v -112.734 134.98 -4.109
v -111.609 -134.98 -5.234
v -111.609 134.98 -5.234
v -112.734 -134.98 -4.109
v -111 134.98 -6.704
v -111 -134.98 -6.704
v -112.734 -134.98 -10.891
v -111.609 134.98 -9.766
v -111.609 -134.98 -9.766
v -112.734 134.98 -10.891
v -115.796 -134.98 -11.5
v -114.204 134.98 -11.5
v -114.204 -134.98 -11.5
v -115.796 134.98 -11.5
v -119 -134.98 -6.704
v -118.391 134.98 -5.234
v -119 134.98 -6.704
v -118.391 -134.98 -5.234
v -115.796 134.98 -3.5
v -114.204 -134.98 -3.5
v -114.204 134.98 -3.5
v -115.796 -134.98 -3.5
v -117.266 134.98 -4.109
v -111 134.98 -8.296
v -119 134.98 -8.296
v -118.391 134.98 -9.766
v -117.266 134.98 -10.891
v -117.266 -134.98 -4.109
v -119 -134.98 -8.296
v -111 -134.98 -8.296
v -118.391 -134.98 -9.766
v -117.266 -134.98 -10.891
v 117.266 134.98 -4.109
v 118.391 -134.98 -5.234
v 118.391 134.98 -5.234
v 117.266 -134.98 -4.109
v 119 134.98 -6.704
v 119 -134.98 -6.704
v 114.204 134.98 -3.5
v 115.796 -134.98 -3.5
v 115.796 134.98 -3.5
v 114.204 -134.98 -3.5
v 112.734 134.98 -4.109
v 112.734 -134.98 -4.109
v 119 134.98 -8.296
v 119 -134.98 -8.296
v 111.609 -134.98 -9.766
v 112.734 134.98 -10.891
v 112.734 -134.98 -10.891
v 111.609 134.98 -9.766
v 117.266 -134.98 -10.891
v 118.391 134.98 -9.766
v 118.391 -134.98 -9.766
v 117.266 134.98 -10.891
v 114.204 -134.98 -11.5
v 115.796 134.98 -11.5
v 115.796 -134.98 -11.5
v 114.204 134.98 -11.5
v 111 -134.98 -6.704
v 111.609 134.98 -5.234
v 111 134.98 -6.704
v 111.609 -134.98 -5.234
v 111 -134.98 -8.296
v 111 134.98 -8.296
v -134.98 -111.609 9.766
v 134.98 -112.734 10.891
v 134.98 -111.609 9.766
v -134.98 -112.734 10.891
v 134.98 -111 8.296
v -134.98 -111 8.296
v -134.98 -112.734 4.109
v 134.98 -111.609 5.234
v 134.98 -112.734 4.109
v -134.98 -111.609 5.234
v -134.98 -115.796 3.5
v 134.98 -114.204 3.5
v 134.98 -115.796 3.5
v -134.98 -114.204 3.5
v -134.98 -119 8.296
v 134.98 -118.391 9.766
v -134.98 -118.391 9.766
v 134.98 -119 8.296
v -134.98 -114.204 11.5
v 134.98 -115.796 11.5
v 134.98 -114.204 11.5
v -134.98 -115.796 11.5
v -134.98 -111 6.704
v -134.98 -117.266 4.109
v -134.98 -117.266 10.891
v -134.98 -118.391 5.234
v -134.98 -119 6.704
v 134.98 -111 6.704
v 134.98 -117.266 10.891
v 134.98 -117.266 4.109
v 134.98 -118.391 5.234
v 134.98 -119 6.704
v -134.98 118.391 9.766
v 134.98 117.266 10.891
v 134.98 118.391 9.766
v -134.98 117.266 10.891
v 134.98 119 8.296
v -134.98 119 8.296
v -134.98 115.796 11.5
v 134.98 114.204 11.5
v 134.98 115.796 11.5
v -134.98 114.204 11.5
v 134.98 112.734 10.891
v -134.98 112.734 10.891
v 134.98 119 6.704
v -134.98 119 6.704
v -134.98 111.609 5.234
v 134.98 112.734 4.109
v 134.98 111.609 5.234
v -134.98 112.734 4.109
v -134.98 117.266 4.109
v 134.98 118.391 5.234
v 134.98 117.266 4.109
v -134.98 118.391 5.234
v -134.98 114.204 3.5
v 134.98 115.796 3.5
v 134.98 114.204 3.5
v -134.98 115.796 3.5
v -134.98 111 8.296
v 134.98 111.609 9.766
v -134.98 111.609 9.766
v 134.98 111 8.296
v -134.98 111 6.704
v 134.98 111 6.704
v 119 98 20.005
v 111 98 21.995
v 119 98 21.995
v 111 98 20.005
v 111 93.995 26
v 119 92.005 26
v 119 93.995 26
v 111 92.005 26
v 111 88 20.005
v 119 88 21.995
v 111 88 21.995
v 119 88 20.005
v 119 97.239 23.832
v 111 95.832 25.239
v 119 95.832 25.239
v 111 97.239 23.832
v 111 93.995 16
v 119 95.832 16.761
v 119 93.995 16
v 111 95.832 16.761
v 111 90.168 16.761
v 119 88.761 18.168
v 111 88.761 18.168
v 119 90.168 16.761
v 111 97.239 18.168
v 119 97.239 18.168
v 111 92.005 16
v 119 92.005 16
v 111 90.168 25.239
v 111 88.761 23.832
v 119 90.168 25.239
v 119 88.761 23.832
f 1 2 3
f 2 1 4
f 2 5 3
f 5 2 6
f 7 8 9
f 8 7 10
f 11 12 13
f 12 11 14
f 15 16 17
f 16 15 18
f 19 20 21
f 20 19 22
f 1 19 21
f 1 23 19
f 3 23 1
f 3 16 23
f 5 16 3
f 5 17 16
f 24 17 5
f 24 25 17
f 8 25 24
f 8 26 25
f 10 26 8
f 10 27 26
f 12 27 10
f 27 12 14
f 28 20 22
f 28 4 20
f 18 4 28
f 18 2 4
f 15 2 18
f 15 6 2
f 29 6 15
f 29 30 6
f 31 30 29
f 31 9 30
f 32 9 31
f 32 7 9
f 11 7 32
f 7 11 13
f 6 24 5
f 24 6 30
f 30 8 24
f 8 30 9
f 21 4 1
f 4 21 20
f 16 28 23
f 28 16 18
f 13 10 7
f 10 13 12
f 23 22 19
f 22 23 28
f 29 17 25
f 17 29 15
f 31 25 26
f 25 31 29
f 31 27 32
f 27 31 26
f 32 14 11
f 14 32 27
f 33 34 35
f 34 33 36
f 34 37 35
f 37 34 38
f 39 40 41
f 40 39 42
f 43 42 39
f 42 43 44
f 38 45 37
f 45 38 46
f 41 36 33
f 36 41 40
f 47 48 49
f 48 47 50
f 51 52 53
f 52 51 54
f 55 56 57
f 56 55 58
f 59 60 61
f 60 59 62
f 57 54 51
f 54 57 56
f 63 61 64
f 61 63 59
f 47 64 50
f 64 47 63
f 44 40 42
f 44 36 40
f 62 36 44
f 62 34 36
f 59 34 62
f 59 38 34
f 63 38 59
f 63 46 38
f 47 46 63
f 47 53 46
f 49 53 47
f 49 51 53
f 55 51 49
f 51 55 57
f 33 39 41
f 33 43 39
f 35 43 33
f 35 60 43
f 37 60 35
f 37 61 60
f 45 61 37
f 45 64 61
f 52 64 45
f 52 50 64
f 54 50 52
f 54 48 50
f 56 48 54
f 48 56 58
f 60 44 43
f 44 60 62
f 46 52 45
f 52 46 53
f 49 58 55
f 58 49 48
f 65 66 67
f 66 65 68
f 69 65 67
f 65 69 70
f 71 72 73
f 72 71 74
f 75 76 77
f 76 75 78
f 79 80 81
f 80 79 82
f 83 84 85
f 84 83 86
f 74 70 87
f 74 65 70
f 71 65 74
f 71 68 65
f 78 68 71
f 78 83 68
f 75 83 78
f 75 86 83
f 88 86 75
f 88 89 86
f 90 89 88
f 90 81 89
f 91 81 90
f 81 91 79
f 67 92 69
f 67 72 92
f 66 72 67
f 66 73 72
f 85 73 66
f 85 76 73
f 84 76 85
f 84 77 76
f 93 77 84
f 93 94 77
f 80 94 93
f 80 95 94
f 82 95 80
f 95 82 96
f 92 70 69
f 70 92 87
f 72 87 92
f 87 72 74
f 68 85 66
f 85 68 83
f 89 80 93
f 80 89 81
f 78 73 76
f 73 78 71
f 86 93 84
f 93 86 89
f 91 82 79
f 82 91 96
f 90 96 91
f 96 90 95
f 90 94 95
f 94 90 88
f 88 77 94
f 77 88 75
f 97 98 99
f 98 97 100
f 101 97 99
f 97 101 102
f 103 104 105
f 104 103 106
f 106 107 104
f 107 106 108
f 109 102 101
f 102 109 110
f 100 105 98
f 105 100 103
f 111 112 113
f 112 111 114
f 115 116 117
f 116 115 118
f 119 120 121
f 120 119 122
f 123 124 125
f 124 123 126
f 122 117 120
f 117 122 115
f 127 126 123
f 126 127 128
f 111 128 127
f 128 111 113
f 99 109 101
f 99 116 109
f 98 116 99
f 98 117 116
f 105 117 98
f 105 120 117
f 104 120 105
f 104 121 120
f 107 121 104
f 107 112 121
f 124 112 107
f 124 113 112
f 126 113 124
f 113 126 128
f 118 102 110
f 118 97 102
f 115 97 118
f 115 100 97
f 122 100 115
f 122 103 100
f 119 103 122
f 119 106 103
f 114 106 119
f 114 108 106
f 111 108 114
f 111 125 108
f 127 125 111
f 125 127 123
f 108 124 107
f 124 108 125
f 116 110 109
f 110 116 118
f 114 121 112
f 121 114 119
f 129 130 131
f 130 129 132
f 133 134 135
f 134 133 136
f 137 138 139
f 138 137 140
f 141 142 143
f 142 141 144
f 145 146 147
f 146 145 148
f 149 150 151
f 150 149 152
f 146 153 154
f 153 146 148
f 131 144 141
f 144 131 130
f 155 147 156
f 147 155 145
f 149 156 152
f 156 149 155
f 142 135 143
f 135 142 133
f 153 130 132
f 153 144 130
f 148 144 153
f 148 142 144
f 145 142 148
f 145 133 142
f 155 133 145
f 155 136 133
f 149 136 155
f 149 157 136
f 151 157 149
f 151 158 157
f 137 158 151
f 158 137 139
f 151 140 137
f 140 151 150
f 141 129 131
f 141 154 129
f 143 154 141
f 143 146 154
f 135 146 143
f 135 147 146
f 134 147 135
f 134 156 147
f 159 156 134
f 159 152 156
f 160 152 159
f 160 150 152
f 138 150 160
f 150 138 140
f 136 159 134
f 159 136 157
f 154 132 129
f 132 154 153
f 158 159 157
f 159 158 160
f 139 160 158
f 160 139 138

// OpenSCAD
// file: util.scad
function accurate_diam(diam,sides) = 1 / cos(180/sides) / 2 * diam;

module hole(diam,len,sides=8) {
  rotate([0,0,180/sides]) {
    cylinder(r=accurate_diam(diam,sides),h=len,center=true,$fn=sides);
  }
}

module accurate_circle(diam,sides=8) {
  rotate([0,0,180/sides]) {
    circle(r=accurate_diam(diam,sides),center=true,$fn=sides);
  }
}

module debug_axes() {
  color("red") {
    translate([50,0,0]) cube([100,.2,.2],center=true);
    translate([0,50,0]) cube([.2,100,.2],center=true);
    translate([0,0,50]) cube([.2,.2,100],center=true);
  }
}
// main file
use     <util.scad>;
include <config.scad>;

resolution = 16;
rod_diam   = 8;

build = 200;

xy_offset = bearing_diam;

xy_overhead = bearing_diam;
rod_len = build + xy_overhead*4 + sheet_thickness*2;
rod_pos = build/2 + xy_overhead;

module motor() {
  difference() {
    translate([0,0,-motor_side/2]) cube([motor_side,motor_side,motor_side],center=true);
    for(end=[left,right]) {
      for(side=[front,rear]) {
        translate([motor_hole_spacing/2*side,motor_hole_spacing/2*end,0]) cylinder(r=motor_screw_diam/2,h=100,center=true);
      }
    }
  }

  translate([0,0,motor_shaft_len/2]) cylinder(r=motor_shaft_diam/2,h=motor_shaft_len,center=true);
}

module axis_rod_set() {
  for(x=[left,right]) {
    translate([rod_pos*x,0,0]) {
      rotate([90,0,0]) {
        color("silver") hole(8,rod_len,resolution);
      }
    }
  }
}

translate([0,0,-xy_offset/2]) {
  rotate([0,0,0]) {
    axis_rod_set();
  }
}
translate([0,0,xy_offset/2]) {
  rotate([0,0,90]) {
    axis_rod_set();
  }
}

% cube([build,build,xy_offset],center=true);
for(n=[-1,1]) {
  translate([(rod_len/2-sheet_thickness/2)*n,0,0]) {
    % cube([sheet_thickness,rod_len,xy_offset*4],center=true);
  }
  translate([0,(rod_len/2-sheet_thickness/2)*n,0]) {
    % cube([rod_len,sheet_thickness,xy_offset*4],center=true);
  }
}

belt_idler_height = 8;

/*
translate([rod_pos-xy_overhead/2,rod_len/2-sheet_thickness-motor_side/2,xy_offset/2+motor_side/2+xy_overhead]) {
  translate([0,0,-motor_hole_spacing/2]) {
    for(y=[front]) {
      translate([xy_overhead/2,motor_hole_spacing/2*y,0]) {
        rotate([0,90,0]) {
          hole(10,8,resolution);
        }
      }
    }
  }
  rotate([0,90,0]) {
    % motor();
  }
}
*/
translate([rod_len/2,rod_len/2-sheet_thickness-motor_side/2,xy_offset+motor_side/2]) {
  translate([0,0,-motor_hole_spacing/2]) {
    for(y=[front]) {
      translate([-sheet_thickness-xy_overhead,motor_hole_spacing/2*y,0]) {
        rotate([0,90,0]) {
          hole(10,8,resolution);
        }
      }
    }
  }
  rotate([0,-90,0]) {
    % motor();
  }
}
